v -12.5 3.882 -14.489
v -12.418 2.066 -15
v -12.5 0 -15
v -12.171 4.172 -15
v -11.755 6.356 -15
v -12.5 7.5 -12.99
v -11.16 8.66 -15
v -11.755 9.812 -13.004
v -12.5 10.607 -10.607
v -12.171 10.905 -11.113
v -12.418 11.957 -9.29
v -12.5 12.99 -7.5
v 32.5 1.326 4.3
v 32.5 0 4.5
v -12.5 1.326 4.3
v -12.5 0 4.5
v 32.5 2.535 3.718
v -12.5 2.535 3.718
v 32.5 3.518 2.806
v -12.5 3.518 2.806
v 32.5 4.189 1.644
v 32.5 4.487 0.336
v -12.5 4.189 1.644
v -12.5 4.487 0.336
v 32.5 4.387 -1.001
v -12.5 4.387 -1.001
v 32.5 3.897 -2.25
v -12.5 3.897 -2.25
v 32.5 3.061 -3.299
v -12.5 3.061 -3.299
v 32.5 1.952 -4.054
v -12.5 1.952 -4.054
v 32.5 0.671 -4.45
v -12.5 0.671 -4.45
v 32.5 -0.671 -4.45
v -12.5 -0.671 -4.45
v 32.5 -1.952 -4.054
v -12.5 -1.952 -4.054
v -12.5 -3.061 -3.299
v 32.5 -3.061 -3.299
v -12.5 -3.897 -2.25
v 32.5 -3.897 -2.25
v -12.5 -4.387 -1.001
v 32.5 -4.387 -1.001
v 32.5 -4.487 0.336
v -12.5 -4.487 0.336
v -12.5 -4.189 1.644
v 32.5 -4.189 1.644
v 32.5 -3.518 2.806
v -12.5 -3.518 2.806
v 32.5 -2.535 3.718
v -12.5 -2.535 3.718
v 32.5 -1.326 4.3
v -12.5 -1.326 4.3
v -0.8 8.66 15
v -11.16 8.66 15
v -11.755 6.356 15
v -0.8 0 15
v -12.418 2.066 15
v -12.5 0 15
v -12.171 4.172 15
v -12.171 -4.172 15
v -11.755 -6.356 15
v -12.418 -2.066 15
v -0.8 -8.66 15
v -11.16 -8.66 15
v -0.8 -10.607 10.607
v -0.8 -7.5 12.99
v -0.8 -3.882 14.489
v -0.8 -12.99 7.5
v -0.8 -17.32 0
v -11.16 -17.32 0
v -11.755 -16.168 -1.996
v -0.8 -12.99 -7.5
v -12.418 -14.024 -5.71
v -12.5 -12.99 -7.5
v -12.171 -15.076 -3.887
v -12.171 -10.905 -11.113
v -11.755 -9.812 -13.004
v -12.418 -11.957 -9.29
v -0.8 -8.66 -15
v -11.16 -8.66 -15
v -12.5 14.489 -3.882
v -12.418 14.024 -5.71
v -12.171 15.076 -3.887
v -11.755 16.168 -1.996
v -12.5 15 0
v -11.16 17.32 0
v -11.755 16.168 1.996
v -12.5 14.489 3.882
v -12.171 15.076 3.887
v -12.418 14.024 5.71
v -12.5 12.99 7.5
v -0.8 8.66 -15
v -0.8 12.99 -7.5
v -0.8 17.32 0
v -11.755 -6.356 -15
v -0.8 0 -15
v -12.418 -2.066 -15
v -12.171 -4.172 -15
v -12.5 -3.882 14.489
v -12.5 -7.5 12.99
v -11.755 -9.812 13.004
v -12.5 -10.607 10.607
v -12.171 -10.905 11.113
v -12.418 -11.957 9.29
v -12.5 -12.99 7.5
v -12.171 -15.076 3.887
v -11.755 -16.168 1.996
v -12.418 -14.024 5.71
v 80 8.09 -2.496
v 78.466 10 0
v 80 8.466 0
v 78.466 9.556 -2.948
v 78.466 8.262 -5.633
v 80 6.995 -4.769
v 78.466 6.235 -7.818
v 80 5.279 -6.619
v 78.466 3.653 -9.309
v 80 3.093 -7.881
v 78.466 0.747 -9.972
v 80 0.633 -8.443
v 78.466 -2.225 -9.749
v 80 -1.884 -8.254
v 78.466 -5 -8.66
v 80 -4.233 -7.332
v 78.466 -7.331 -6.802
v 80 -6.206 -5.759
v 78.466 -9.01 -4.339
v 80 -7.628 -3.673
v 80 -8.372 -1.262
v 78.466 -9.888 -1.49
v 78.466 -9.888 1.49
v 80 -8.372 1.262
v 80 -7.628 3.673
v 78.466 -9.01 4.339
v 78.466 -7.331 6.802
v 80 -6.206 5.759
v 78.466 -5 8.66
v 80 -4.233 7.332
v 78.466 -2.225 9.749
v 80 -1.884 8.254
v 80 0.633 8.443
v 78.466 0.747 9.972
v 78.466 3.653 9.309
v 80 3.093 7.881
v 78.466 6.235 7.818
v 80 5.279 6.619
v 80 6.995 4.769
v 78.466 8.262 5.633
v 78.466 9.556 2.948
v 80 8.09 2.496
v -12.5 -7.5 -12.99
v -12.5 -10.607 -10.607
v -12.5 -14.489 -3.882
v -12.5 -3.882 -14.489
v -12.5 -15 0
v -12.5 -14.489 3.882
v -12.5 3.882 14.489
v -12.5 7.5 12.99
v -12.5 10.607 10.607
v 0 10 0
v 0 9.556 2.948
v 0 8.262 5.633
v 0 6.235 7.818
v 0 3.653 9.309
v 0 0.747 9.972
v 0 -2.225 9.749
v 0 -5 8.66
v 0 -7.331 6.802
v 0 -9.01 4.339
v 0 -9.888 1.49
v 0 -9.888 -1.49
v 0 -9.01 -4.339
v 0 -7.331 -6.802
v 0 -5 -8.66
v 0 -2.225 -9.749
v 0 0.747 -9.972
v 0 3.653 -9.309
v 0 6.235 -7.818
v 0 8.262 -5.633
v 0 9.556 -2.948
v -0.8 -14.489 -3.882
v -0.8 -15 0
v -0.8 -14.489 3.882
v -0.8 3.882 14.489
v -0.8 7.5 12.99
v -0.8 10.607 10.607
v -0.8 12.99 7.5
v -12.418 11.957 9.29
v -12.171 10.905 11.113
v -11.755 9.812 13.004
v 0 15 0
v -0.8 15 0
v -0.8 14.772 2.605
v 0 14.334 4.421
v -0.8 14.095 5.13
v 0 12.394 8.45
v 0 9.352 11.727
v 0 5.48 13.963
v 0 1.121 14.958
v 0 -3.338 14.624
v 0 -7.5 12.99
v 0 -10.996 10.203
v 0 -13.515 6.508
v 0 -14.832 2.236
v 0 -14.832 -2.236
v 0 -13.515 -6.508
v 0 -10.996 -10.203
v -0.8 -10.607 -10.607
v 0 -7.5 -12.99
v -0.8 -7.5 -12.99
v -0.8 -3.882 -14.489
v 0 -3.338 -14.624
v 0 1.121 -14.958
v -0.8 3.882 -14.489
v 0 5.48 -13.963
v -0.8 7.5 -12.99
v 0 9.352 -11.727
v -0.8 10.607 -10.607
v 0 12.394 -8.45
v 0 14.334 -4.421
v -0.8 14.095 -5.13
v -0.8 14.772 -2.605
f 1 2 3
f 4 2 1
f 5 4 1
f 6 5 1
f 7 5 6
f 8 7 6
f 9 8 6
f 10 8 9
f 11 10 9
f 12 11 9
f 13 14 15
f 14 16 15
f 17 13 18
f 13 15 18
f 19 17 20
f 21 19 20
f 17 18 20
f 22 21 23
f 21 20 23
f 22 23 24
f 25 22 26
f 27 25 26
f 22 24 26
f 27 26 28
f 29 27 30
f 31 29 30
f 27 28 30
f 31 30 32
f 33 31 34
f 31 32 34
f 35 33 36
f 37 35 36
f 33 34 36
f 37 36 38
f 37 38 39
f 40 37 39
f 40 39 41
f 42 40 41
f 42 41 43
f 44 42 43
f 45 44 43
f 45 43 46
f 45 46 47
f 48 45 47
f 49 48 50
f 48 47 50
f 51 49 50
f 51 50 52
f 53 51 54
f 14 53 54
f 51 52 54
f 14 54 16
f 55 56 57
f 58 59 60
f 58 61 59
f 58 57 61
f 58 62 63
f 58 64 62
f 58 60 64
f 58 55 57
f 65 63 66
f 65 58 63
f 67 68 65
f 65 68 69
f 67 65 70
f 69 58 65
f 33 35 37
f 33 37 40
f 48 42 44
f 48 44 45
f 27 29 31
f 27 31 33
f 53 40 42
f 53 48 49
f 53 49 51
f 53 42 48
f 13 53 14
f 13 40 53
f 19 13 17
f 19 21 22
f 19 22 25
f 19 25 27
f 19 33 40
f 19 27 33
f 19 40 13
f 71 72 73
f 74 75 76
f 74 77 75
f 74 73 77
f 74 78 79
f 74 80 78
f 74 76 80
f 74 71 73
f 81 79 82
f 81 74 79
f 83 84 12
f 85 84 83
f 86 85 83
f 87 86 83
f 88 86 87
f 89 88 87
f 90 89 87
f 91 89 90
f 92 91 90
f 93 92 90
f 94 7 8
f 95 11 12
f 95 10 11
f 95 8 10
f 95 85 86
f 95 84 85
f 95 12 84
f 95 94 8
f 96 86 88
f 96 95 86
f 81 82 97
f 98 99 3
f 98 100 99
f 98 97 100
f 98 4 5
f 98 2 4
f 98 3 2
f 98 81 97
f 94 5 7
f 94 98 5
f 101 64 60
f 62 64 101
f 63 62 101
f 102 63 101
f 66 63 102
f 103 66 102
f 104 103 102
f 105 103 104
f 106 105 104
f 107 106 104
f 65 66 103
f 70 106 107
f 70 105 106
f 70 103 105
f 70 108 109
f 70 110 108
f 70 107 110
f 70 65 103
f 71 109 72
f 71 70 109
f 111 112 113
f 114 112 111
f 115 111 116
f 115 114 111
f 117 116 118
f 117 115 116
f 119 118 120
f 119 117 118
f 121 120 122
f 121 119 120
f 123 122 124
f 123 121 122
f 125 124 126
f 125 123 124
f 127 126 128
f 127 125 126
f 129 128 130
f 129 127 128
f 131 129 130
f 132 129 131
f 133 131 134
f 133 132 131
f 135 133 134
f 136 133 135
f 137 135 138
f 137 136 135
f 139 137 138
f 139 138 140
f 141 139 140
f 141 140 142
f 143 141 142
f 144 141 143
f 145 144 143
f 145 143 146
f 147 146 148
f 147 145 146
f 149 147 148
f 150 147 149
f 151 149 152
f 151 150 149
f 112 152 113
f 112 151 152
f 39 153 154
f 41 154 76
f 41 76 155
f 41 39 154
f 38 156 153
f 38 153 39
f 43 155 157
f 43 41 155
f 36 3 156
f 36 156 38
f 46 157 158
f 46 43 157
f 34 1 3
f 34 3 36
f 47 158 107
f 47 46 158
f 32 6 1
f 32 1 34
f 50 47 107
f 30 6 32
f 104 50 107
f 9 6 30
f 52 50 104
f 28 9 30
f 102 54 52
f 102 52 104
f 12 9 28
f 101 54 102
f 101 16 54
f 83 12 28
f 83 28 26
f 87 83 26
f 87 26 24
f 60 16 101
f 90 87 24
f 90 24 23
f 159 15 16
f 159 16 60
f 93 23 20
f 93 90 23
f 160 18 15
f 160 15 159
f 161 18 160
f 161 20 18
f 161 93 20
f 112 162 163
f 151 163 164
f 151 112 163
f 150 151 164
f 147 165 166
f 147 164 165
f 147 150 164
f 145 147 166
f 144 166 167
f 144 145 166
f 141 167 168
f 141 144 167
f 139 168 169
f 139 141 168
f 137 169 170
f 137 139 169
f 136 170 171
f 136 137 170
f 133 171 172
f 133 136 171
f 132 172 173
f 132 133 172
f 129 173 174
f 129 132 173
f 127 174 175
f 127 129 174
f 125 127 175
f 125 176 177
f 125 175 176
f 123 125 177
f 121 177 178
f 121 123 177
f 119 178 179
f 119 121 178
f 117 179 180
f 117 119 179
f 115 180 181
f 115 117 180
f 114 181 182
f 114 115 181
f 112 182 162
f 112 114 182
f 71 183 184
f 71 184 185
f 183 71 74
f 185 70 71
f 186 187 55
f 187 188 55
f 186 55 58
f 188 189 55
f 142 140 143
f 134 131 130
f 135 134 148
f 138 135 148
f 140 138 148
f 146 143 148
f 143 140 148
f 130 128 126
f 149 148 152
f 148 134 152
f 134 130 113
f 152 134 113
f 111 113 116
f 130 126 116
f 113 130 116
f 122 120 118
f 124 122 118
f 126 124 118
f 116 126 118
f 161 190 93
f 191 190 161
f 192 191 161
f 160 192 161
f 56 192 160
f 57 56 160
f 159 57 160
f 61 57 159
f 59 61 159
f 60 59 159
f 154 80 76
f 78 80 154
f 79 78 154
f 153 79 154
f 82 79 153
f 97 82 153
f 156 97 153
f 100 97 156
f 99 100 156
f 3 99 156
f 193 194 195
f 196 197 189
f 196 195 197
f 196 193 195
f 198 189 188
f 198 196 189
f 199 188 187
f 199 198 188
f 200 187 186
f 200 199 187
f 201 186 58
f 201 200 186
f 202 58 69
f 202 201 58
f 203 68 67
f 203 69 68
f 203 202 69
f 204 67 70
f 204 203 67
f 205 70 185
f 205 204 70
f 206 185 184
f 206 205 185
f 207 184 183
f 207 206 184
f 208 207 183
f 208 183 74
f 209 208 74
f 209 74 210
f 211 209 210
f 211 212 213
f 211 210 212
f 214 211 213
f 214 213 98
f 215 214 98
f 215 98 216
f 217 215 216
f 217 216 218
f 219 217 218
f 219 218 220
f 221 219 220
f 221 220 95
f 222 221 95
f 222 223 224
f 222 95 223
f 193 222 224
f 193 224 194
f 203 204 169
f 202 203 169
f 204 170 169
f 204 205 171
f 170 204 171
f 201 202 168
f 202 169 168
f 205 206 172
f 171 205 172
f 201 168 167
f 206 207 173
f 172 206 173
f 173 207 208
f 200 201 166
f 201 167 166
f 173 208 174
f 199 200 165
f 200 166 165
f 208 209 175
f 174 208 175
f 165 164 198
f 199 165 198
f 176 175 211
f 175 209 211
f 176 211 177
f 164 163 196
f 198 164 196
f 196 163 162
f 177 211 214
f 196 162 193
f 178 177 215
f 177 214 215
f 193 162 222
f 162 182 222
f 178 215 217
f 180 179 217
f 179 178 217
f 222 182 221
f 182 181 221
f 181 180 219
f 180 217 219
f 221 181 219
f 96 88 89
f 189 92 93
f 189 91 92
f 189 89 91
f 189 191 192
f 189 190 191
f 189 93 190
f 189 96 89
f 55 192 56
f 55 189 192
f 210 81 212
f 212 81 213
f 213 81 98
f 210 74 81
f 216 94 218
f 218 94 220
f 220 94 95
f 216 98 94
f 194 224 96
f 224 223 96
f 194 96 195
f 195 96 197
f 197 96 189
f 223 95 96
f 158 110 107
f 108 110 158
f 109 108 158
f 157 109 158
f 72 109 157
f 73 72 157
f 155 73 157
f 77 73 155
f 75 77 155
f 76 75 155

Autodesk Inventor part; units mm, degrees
ref_plane "YZ Plane" through (0, 0, 0) normal (1, 0, 0) x (0, 1, 0)
ref_plane "XZ Plane" through (0, 0, 0) normal (0, 1, 0) x (-1, 0, 0)
sketch "Sketch1" plane through (0, 0, 0) normal (0, 0, 1) x (1, 0, 0)
  line L0 (0, 15) -> (0, 10)
  line L1 (7.5, 10) -> (80, 10)
  line L2 (80, 10) -> (80, 0)
  line L3 (80, 0) -> (-0.8001, 0)
  line L4 (-16.9601, 0) -> (96.16, 0) projected
  line L5 (-0.8001, 0) -> (-0.8001, 15)
  line L6 (-0.8001, 15) -> (0, 15)
  line L7 (7.5, 10) -> (5.9663, 10)
  line L8 (5.9663, 10) -> (0, 10)
  line L9 (0, -3) -> (0, 18) projected
  dimension "d0" = 80
  dimension "d1" = 72.5
  dimension "d2" = 20
  dimension "d9" = 0.8001
  dimension "d10" = 30
  dimension "d13" = 1.5337
  dimension "d14" = 20
revolve "Body" add sketch "Sketch1" angle 360 about axis through (80, 0, 0) along (-1, 0, 0)
sketch "Sketch2" plane through (-0.8001, 0, 0) normal (-1, 0, 0) x (0, 0, 1)
  line L0 (0, 17.3205) -> (15, 8.6603)
  line L1 (15, 8.6603) -> (15, -8.6603)
  line L2 (15, -8.6603) -> (0, -17.3205)
  line L3 (0, -17.3205) -> (-15, -8.6603)
  line L4 (-15, -8.6603) -> (-15, 8.6603)
  line L5 (-15, 8.6603) -> (0, 17.3205)
  point P0 (0, 0)
  point P1 (0, 0)
  dimension "d11" = 30
extrude "Head" add sketch "Sketch2" along normal blind 11.7
sketch "Sketch4" plane through (0, 0, 0) normal (0, 0, 1) x (1, 0, 0)
  line L0 (-12.5001, 15) -> (-12.5001, 17.3205)
  line L1 (-12.5001, 17.3205) -> (-11.1604, 17.3205)
  line L2 (-11.1604, 17.3205) -> (-12.5001, 15)
  line L3 (-14.8401, 0) -> (1.5399, 0) projected
  line L4 (-0.8001, 17.3205) -> (-12.5001, 17.3205) projected
  line L5 (-12.5001, 8.6603) -> (-12.5001, 17.3205) projected
  dimension "d5" = 30
  dimension "d19" = 30
revolve "Chamfer1" cut sketch "Sketch4" angle 360 about axis through (-10, 0, 0) along (1, 0, 0)
thread "Thread" size "M20x2.5" class "6g" standard "ISO Metric profile" length 72.5
chamfer "Chamfer2" distance 1.5336 distance2 1.5337 1 edges at (80, -10, 0) measured on face at (80, -2.8768, 3.7595)
ref_plane "Work Plane1" through (1.525, 0, 0) normal (0, 0, 1) x (1, 0, 0)
sketch "Sketch7" plane through (-12.5001, 0, 0) normal (-1, 0, 0) x (0, 0, 1)
  circle A0 centre (0, 0) radius 4.5
  dimension "d59" = 9
extrude "Extrusion5" cut sketch "Sketch7" against normal blind 45
equation "\"d11\" = SW"
equation "\"d3\" = KOH - SD"
equation "\"d15\" = GEL"
equation "\"d6\" = -0.5 * SPD + 0.5 * GD"
equation "\"d0\" = NLG"
equation "\"d1\" = GEL"
equation "\"d2\" = GD"
equation "\"d10\" = SD2"
equation "\"d14\" = BDM"
equation "\"d5\" = ANG1"
equation "\"d19\" = SW0"
equation "\"NLG\" = 80"
equation "\"GD\" = NND"
equation "\"BDM\" = NND"
equation "\"KOH\" = 12.5"
equation "\"GEL\" = 72.5"
equation "\"SW\" = 30"
equation "\"SW0\" = SW"
equation "\"SPD\" = NND - 1.2269 * PTC"
equation "\"SD2\" = SW"
equation "\"SD\" = 0.8"
equation "\"ANG1\" = 30deg"
equation "\"GAL\" = 0.61345 * PTC"
equation "\"GUL\" = 0.61345 * PTC"
equation "\"RR\" = 0.8"
equation "\"WFT\" = SD"
equation "\"GD1\" = THREADDIA - 1.2269 * PTC"
equation "\"TOA\" = 30deg"
equation "\"FAWI\" = 45deg"
equation "\"PTC\" = 2.5"
equation "\"E0\" = 1.155 * SW"
equation "\"NND\" = 20"
equation "\"THREADDIA\" = 20"
properties part number "AS 1110 - M20 x 80" material "Steel, Mild"
